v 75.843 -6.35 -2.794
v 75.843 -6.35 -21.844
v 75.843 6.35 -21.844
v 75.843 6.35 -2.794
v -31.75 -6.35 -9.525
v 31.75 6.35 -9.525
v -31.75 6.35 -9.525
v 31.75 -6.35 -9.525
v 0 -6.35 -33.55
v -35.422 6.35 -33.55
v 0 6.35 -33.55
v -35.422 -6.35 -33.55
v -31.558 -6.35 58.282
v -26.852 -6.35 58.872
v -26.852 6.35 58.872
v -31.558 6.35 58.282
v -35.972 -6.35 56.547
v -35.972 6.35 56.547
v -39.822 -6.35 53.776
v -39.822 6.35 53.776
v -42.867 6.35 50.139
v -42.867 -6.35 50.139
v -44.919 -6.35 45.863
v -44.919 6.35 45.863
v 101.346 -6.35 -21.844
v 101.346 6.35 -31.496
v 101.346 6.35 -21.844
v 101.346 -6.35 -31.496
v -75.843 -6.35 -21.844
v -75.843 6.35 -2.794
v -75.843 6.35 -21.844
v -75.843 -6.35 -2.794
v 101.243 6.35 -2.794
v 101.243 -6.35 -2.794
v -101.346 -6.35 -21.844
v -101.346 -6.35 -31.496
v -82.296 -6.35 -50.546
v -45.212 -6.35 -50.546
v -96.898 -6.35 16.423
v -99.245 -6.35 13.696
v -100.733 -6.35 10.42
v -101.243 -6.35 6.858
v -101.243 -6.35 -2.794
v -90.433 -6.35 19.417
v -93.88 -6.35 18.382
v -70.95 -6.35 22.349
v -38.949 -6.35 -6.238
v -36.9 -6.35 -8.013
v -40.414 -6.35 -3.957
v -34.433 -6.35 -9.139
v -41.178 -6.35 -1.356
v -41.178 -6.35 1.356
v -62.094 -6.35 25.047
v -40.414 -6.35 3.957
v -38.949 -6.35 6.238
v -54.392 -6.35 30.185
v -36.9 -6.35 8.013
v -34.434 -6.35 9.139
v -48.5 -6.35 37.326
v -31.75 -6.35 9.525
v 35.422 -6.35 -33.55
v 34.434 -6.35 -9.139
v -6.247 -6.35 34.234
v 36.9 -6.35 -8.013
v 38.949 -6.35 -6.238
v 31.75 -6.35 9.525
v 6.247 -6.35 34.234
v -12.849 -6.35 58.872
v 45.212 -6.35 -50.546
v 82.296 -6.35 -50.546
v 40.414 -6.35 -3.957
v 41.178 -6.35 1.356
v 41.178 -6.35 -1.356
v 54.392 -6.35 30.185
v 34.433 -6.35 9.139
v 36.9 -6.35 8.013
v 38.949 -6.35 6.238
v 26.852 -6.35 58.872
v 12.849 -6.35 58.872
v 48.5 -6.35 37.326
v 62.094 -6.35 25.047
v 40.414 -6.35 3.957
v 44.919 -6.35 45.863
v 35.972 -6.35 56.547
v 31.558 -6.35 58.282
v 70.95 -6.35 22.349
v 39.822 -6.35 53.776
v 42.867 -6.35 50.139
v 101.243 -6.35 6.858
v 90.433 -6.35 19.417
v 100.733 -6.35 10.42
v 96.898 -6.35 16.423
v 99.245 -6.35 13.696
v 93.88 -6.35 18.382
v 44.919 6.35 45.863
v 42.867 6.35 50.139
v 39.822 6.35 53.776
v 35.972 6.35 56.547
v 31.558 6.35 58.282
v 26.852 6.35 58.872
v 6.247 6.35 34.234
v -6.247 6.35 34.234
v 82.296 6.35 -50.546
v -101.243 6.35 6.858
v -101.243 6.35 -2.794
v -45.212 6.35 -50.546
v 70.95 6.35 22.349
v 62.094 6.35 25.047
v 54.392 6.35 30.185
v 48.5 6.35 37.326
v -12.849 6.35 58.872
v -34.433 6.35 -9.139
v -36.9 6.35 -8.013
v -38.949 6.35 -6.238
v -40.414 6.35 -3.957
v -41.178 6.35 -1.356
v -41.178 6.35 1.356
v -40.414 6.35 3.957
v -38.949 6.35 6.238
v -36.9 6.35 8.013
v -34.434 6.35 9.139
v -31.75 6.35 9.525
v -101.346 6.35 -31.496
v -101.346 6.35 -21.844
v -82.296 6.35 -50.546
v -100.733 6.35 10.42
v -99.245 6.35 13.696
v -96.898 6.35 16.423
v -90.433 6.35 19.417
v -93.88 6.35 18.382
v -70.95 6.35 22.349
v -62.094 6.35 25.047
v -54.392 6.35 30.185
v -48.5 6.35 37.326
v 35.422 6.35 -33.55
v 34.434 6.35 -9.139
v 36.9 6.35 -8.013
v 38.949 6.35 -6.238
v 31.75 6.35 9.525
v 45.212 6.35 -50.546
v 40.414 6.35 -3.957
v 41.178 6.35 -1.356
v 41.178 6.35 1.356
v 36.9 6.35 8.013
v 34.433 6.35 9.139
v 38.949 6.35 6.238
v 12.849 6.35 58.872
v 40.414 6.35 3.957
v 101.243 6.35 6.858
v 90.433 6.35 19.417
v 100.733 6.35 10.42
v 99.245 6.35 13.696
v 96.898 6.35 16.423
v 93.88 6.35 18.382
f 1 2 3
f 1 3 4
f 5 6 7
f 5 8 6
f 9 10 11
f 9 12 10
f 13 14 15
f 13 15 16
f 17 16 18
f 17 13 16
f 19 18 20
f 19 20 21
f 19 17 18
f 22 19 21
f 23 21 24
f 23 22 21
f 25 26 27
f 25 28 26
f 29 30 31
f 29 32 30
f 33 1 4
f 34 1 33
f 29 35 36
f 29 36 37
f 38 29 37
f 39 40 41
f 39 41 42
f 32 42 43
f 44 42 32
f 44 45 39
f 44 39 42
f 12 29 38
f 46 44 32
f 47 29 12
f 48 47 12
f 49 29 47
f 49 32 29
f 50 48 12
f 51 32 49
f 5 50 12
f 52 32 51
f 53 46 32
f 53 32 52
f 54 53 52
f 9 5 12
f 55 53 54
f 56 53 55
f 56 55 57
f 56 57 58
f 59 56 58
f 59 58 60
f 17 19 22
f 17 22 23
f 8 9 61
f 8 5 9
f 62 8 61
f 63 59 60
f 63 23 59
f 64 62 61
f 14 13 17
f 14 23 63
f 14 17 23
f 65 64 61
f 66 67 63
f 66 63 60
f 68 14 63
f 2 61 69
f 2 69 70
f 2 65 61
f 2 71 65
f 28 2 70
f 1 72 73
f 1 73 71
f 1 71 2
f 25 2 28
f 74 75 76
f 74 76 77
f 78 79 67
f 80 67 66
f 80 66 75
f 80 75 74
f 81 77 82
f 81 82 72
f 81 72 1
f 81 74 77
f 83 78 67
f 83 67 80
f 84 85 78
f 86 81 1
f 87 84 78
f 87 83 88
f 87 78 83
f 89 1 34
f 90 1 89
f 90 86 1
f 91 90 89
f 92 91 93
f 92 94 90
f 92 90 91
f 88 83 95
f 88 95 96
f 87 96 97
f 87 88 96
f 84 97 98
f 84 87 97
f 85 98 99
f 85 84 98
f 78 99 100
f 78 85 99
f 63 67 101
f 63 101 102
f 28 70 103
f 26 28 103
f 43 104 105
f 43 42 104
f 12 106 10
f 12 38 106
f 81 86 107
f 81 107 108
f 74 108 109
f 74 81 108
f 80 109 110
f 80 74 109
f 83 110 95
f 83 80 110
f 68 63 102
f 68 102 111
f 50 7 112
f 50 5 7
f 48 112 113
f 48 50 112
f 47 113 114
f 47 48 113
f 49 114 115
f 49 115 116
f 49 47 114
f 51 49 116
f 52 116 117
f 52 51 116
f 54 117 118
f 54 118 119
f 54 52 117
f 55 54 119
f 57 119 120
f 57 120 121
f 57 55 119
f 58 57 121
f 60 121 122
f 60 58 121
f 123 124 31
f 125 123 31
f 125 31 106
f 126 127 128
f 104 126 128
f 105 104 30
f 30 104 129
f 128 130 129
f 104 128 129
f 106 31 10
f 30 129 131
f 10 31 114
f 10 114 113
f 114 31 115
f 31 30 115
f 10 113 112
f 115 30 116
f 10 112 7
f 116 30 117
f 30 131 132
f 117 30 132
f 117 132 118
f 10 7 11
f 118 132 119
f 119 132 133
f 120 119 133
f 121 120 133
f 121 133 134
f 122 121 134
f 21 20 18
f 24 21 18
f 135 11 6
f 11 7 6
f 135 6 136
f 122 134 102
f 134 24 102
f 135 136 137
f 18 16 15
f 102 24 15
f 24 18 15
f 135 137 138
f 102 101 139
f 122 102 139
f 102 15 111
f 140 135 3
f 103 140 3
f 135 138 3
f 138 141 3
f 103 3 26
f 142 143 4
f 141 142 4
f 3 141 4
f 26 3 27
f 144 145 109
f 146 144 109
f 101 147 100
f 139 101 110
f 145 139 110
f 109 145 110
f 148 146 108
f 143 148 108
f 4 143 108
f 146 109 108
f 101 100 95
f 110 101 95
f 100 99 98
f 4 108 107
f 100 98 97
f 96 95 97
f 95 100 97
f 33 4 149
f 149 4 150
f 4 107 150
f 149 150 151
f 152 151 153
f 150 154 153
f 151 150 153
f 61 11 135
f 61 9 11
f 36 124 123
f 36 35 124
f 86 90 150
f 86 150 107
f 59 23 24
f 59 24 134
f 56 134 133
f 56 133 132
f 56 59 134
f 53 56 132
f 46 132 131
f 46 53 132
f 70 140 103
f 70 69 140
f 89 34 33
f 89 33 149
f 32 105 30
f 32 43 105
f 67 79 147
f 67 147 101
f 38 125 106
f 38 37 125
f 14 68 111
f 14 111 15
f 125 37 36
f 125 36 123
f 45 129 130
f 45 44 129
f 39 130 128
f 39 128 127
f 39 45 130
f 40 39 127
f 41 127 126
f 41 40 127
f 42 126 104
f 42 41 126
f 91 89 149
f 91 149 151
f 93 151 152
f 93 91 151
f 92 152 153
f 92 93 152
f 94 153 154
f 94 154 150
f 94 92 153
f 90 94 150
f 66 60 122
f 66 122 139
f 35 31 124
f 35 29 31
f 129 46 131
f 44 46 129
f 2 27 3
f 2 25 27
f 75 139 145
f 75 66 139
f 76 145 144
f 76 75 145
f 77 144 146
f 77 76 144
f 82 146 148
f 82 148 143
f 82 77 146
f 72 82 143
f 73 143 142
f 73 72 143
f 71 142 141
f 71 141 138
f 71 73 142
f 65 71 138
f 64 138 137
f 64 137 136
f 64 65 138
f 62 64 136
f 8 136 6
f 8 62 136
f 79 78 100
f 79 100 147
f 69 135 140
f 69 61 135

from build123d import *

# Parameters (mm, degrees)
F1_DEPTH = 6.35
F2_SIZE2 = 19.05
F2_SIZE  = 19.05
F3_SIZE2 = 19.05
F3_SIZE  = 19.05


# Not quite as in the source:
# - ends of sketch curves that miss each other by under 0.0002 mm in the source are joined


with BuildPart() as f1:
    # F0 (on Front) → F1 (new body, symmetric)
    with BuildSketch(Plane.XZ):
        with BuildLine():
            Line((101.3459994669, -21.8439942511), (75.8431146328, -21.8439942511))
            Line((75.8431146328, -21.8439942511), (75.8431146328, -2.7939942511))
            Line((75.8431146328, -2.7939942511), (101.2431146328, -2.7939942511))
            Line((101.2431146328, -2.7939942511), (101.2431146328, 6.8580057489))
            ThreePointArc((101.2431146328, 6.8580057489), (98.1684202272, 15.1431425742), (90.4331158589, 19.4165843056))
            Line((90.4331158589, 19.4165843056), (70.9499079155, 22.3487064989))
            ThreePointArc((70.9499079155, 22.3487064989), (54.3920764202, 30.184519391), (44.9188305794, 45.8631469058))
            ThreePointArc((44.9188305794, 45.8631469058), (37.9835870307, 55.281692466), (26.8519516779, 58.8724163371))
            Line((26.8519516779, 58.8724163371), (12.8488468359, 58.8724155428))
            Line((12.8488468359, 58.8724155428), (6.2471146328, 34.2344155428))
            Line((6.2471146328, 34.2344155428), (-6.2471205082, 34.2344155428))
            Line((-6.2471205082, 34.2344155428), (-12.848854109, 58.8724148139))
            Line((-12.848854109, 58.8724148139), (-26.8519589509, 58.8724148139))
            ThreePointArc((-26.8519589509, 58.8724148139), (-37.9835941001, 55.2816903113), (-44.9188371145, 45.8631443577))
            ThreePointArc((-44.9188371145, 45.8631443577), (-54.3920820431, 30.1845162803), (-70.9499131167, 22.3487024742))
            Line((-70.9499131167, 22.3487024742), (-90.4331208938, 19.4165791758))
            ThreePointArc((-90.4331208938, 19.4165791758), (-98.1684250197, 15.1431370056), (-101.2431189553, 6.8580000058))
            Line((-101.2431189553, 6.8580000058), (-101.2431189553, -2.7939999942))
            Line((-101.2431189553, -2.7939999942), (-75.8431173272, -2.7939999942))
            Line((-75.8431173272, -2.7939999942), (-75.8431173272, -21.8439985533))
            Line((-75.8431173272, -21.8439985533), (-101.3460021612, -21.844))
            Line((-101.3460021612, -21.844), (-101.3460005331, -50.546))
            Line((-101.3460005331, -50.546), (-45.2120005331, -50.5459968158))
            Line((-45.2120005331, -50.5459968158), (-35.4220414842, -33.5504287171))
            Line((-35.4220414842, -33.5504287171), (-1.0151e-06, -33.5504287171))
            Line((-1.0151e-06, -33.5504287171), (35.4220394539, -33.5504267077))
            Line((35.4220394539, -33.5504267077), (45.2119994669, -50.5459942511))
            Line((45.2119994669, -50.5459942511), (101.3459994669, -50.5459942511))
            Line((101.3459994669, -50.5459942511), (101.3459994669, -21.8439942511))
        make_face()
        with BuildLine():
            Line((-31.7500042241, 9.525), (31.7499957759, 9.525))
            ThreePointArc((31.7499957759, 9.525), (41.2750042241, 4.2241e-06), (31.7500042241, -9.525))
            Line((31.7500042241, -9.525), (-31.7499957759, -9.525))
            ThreePointArc((-31.7499957759, -9.525), (-41.2750042241, -4.2241e-06), (-31.7500042241, 9.525))
        make_face(mode=Mode.SUBTRACT)
    extrude(amount=F1_DEPTH, both=True)

    # F2
    f2_edges = [f1.edges().sort_by_distance(p)[0] for p in [
        (101.345999, 0, -50.545994),
    ]]
    chamfer(f2_edges, length=F2_SIZE, length2=F2_SIZE2)

    # F3
    f3_edges = [f1.edges().sort_by_distance(p)[0] for p in [
        (-101.346001, 0, -50.546),
    ]]
    chamfer(f3_edges, length=F3_SIZE, length2=F3_SIZE2)


solid = f1.part
